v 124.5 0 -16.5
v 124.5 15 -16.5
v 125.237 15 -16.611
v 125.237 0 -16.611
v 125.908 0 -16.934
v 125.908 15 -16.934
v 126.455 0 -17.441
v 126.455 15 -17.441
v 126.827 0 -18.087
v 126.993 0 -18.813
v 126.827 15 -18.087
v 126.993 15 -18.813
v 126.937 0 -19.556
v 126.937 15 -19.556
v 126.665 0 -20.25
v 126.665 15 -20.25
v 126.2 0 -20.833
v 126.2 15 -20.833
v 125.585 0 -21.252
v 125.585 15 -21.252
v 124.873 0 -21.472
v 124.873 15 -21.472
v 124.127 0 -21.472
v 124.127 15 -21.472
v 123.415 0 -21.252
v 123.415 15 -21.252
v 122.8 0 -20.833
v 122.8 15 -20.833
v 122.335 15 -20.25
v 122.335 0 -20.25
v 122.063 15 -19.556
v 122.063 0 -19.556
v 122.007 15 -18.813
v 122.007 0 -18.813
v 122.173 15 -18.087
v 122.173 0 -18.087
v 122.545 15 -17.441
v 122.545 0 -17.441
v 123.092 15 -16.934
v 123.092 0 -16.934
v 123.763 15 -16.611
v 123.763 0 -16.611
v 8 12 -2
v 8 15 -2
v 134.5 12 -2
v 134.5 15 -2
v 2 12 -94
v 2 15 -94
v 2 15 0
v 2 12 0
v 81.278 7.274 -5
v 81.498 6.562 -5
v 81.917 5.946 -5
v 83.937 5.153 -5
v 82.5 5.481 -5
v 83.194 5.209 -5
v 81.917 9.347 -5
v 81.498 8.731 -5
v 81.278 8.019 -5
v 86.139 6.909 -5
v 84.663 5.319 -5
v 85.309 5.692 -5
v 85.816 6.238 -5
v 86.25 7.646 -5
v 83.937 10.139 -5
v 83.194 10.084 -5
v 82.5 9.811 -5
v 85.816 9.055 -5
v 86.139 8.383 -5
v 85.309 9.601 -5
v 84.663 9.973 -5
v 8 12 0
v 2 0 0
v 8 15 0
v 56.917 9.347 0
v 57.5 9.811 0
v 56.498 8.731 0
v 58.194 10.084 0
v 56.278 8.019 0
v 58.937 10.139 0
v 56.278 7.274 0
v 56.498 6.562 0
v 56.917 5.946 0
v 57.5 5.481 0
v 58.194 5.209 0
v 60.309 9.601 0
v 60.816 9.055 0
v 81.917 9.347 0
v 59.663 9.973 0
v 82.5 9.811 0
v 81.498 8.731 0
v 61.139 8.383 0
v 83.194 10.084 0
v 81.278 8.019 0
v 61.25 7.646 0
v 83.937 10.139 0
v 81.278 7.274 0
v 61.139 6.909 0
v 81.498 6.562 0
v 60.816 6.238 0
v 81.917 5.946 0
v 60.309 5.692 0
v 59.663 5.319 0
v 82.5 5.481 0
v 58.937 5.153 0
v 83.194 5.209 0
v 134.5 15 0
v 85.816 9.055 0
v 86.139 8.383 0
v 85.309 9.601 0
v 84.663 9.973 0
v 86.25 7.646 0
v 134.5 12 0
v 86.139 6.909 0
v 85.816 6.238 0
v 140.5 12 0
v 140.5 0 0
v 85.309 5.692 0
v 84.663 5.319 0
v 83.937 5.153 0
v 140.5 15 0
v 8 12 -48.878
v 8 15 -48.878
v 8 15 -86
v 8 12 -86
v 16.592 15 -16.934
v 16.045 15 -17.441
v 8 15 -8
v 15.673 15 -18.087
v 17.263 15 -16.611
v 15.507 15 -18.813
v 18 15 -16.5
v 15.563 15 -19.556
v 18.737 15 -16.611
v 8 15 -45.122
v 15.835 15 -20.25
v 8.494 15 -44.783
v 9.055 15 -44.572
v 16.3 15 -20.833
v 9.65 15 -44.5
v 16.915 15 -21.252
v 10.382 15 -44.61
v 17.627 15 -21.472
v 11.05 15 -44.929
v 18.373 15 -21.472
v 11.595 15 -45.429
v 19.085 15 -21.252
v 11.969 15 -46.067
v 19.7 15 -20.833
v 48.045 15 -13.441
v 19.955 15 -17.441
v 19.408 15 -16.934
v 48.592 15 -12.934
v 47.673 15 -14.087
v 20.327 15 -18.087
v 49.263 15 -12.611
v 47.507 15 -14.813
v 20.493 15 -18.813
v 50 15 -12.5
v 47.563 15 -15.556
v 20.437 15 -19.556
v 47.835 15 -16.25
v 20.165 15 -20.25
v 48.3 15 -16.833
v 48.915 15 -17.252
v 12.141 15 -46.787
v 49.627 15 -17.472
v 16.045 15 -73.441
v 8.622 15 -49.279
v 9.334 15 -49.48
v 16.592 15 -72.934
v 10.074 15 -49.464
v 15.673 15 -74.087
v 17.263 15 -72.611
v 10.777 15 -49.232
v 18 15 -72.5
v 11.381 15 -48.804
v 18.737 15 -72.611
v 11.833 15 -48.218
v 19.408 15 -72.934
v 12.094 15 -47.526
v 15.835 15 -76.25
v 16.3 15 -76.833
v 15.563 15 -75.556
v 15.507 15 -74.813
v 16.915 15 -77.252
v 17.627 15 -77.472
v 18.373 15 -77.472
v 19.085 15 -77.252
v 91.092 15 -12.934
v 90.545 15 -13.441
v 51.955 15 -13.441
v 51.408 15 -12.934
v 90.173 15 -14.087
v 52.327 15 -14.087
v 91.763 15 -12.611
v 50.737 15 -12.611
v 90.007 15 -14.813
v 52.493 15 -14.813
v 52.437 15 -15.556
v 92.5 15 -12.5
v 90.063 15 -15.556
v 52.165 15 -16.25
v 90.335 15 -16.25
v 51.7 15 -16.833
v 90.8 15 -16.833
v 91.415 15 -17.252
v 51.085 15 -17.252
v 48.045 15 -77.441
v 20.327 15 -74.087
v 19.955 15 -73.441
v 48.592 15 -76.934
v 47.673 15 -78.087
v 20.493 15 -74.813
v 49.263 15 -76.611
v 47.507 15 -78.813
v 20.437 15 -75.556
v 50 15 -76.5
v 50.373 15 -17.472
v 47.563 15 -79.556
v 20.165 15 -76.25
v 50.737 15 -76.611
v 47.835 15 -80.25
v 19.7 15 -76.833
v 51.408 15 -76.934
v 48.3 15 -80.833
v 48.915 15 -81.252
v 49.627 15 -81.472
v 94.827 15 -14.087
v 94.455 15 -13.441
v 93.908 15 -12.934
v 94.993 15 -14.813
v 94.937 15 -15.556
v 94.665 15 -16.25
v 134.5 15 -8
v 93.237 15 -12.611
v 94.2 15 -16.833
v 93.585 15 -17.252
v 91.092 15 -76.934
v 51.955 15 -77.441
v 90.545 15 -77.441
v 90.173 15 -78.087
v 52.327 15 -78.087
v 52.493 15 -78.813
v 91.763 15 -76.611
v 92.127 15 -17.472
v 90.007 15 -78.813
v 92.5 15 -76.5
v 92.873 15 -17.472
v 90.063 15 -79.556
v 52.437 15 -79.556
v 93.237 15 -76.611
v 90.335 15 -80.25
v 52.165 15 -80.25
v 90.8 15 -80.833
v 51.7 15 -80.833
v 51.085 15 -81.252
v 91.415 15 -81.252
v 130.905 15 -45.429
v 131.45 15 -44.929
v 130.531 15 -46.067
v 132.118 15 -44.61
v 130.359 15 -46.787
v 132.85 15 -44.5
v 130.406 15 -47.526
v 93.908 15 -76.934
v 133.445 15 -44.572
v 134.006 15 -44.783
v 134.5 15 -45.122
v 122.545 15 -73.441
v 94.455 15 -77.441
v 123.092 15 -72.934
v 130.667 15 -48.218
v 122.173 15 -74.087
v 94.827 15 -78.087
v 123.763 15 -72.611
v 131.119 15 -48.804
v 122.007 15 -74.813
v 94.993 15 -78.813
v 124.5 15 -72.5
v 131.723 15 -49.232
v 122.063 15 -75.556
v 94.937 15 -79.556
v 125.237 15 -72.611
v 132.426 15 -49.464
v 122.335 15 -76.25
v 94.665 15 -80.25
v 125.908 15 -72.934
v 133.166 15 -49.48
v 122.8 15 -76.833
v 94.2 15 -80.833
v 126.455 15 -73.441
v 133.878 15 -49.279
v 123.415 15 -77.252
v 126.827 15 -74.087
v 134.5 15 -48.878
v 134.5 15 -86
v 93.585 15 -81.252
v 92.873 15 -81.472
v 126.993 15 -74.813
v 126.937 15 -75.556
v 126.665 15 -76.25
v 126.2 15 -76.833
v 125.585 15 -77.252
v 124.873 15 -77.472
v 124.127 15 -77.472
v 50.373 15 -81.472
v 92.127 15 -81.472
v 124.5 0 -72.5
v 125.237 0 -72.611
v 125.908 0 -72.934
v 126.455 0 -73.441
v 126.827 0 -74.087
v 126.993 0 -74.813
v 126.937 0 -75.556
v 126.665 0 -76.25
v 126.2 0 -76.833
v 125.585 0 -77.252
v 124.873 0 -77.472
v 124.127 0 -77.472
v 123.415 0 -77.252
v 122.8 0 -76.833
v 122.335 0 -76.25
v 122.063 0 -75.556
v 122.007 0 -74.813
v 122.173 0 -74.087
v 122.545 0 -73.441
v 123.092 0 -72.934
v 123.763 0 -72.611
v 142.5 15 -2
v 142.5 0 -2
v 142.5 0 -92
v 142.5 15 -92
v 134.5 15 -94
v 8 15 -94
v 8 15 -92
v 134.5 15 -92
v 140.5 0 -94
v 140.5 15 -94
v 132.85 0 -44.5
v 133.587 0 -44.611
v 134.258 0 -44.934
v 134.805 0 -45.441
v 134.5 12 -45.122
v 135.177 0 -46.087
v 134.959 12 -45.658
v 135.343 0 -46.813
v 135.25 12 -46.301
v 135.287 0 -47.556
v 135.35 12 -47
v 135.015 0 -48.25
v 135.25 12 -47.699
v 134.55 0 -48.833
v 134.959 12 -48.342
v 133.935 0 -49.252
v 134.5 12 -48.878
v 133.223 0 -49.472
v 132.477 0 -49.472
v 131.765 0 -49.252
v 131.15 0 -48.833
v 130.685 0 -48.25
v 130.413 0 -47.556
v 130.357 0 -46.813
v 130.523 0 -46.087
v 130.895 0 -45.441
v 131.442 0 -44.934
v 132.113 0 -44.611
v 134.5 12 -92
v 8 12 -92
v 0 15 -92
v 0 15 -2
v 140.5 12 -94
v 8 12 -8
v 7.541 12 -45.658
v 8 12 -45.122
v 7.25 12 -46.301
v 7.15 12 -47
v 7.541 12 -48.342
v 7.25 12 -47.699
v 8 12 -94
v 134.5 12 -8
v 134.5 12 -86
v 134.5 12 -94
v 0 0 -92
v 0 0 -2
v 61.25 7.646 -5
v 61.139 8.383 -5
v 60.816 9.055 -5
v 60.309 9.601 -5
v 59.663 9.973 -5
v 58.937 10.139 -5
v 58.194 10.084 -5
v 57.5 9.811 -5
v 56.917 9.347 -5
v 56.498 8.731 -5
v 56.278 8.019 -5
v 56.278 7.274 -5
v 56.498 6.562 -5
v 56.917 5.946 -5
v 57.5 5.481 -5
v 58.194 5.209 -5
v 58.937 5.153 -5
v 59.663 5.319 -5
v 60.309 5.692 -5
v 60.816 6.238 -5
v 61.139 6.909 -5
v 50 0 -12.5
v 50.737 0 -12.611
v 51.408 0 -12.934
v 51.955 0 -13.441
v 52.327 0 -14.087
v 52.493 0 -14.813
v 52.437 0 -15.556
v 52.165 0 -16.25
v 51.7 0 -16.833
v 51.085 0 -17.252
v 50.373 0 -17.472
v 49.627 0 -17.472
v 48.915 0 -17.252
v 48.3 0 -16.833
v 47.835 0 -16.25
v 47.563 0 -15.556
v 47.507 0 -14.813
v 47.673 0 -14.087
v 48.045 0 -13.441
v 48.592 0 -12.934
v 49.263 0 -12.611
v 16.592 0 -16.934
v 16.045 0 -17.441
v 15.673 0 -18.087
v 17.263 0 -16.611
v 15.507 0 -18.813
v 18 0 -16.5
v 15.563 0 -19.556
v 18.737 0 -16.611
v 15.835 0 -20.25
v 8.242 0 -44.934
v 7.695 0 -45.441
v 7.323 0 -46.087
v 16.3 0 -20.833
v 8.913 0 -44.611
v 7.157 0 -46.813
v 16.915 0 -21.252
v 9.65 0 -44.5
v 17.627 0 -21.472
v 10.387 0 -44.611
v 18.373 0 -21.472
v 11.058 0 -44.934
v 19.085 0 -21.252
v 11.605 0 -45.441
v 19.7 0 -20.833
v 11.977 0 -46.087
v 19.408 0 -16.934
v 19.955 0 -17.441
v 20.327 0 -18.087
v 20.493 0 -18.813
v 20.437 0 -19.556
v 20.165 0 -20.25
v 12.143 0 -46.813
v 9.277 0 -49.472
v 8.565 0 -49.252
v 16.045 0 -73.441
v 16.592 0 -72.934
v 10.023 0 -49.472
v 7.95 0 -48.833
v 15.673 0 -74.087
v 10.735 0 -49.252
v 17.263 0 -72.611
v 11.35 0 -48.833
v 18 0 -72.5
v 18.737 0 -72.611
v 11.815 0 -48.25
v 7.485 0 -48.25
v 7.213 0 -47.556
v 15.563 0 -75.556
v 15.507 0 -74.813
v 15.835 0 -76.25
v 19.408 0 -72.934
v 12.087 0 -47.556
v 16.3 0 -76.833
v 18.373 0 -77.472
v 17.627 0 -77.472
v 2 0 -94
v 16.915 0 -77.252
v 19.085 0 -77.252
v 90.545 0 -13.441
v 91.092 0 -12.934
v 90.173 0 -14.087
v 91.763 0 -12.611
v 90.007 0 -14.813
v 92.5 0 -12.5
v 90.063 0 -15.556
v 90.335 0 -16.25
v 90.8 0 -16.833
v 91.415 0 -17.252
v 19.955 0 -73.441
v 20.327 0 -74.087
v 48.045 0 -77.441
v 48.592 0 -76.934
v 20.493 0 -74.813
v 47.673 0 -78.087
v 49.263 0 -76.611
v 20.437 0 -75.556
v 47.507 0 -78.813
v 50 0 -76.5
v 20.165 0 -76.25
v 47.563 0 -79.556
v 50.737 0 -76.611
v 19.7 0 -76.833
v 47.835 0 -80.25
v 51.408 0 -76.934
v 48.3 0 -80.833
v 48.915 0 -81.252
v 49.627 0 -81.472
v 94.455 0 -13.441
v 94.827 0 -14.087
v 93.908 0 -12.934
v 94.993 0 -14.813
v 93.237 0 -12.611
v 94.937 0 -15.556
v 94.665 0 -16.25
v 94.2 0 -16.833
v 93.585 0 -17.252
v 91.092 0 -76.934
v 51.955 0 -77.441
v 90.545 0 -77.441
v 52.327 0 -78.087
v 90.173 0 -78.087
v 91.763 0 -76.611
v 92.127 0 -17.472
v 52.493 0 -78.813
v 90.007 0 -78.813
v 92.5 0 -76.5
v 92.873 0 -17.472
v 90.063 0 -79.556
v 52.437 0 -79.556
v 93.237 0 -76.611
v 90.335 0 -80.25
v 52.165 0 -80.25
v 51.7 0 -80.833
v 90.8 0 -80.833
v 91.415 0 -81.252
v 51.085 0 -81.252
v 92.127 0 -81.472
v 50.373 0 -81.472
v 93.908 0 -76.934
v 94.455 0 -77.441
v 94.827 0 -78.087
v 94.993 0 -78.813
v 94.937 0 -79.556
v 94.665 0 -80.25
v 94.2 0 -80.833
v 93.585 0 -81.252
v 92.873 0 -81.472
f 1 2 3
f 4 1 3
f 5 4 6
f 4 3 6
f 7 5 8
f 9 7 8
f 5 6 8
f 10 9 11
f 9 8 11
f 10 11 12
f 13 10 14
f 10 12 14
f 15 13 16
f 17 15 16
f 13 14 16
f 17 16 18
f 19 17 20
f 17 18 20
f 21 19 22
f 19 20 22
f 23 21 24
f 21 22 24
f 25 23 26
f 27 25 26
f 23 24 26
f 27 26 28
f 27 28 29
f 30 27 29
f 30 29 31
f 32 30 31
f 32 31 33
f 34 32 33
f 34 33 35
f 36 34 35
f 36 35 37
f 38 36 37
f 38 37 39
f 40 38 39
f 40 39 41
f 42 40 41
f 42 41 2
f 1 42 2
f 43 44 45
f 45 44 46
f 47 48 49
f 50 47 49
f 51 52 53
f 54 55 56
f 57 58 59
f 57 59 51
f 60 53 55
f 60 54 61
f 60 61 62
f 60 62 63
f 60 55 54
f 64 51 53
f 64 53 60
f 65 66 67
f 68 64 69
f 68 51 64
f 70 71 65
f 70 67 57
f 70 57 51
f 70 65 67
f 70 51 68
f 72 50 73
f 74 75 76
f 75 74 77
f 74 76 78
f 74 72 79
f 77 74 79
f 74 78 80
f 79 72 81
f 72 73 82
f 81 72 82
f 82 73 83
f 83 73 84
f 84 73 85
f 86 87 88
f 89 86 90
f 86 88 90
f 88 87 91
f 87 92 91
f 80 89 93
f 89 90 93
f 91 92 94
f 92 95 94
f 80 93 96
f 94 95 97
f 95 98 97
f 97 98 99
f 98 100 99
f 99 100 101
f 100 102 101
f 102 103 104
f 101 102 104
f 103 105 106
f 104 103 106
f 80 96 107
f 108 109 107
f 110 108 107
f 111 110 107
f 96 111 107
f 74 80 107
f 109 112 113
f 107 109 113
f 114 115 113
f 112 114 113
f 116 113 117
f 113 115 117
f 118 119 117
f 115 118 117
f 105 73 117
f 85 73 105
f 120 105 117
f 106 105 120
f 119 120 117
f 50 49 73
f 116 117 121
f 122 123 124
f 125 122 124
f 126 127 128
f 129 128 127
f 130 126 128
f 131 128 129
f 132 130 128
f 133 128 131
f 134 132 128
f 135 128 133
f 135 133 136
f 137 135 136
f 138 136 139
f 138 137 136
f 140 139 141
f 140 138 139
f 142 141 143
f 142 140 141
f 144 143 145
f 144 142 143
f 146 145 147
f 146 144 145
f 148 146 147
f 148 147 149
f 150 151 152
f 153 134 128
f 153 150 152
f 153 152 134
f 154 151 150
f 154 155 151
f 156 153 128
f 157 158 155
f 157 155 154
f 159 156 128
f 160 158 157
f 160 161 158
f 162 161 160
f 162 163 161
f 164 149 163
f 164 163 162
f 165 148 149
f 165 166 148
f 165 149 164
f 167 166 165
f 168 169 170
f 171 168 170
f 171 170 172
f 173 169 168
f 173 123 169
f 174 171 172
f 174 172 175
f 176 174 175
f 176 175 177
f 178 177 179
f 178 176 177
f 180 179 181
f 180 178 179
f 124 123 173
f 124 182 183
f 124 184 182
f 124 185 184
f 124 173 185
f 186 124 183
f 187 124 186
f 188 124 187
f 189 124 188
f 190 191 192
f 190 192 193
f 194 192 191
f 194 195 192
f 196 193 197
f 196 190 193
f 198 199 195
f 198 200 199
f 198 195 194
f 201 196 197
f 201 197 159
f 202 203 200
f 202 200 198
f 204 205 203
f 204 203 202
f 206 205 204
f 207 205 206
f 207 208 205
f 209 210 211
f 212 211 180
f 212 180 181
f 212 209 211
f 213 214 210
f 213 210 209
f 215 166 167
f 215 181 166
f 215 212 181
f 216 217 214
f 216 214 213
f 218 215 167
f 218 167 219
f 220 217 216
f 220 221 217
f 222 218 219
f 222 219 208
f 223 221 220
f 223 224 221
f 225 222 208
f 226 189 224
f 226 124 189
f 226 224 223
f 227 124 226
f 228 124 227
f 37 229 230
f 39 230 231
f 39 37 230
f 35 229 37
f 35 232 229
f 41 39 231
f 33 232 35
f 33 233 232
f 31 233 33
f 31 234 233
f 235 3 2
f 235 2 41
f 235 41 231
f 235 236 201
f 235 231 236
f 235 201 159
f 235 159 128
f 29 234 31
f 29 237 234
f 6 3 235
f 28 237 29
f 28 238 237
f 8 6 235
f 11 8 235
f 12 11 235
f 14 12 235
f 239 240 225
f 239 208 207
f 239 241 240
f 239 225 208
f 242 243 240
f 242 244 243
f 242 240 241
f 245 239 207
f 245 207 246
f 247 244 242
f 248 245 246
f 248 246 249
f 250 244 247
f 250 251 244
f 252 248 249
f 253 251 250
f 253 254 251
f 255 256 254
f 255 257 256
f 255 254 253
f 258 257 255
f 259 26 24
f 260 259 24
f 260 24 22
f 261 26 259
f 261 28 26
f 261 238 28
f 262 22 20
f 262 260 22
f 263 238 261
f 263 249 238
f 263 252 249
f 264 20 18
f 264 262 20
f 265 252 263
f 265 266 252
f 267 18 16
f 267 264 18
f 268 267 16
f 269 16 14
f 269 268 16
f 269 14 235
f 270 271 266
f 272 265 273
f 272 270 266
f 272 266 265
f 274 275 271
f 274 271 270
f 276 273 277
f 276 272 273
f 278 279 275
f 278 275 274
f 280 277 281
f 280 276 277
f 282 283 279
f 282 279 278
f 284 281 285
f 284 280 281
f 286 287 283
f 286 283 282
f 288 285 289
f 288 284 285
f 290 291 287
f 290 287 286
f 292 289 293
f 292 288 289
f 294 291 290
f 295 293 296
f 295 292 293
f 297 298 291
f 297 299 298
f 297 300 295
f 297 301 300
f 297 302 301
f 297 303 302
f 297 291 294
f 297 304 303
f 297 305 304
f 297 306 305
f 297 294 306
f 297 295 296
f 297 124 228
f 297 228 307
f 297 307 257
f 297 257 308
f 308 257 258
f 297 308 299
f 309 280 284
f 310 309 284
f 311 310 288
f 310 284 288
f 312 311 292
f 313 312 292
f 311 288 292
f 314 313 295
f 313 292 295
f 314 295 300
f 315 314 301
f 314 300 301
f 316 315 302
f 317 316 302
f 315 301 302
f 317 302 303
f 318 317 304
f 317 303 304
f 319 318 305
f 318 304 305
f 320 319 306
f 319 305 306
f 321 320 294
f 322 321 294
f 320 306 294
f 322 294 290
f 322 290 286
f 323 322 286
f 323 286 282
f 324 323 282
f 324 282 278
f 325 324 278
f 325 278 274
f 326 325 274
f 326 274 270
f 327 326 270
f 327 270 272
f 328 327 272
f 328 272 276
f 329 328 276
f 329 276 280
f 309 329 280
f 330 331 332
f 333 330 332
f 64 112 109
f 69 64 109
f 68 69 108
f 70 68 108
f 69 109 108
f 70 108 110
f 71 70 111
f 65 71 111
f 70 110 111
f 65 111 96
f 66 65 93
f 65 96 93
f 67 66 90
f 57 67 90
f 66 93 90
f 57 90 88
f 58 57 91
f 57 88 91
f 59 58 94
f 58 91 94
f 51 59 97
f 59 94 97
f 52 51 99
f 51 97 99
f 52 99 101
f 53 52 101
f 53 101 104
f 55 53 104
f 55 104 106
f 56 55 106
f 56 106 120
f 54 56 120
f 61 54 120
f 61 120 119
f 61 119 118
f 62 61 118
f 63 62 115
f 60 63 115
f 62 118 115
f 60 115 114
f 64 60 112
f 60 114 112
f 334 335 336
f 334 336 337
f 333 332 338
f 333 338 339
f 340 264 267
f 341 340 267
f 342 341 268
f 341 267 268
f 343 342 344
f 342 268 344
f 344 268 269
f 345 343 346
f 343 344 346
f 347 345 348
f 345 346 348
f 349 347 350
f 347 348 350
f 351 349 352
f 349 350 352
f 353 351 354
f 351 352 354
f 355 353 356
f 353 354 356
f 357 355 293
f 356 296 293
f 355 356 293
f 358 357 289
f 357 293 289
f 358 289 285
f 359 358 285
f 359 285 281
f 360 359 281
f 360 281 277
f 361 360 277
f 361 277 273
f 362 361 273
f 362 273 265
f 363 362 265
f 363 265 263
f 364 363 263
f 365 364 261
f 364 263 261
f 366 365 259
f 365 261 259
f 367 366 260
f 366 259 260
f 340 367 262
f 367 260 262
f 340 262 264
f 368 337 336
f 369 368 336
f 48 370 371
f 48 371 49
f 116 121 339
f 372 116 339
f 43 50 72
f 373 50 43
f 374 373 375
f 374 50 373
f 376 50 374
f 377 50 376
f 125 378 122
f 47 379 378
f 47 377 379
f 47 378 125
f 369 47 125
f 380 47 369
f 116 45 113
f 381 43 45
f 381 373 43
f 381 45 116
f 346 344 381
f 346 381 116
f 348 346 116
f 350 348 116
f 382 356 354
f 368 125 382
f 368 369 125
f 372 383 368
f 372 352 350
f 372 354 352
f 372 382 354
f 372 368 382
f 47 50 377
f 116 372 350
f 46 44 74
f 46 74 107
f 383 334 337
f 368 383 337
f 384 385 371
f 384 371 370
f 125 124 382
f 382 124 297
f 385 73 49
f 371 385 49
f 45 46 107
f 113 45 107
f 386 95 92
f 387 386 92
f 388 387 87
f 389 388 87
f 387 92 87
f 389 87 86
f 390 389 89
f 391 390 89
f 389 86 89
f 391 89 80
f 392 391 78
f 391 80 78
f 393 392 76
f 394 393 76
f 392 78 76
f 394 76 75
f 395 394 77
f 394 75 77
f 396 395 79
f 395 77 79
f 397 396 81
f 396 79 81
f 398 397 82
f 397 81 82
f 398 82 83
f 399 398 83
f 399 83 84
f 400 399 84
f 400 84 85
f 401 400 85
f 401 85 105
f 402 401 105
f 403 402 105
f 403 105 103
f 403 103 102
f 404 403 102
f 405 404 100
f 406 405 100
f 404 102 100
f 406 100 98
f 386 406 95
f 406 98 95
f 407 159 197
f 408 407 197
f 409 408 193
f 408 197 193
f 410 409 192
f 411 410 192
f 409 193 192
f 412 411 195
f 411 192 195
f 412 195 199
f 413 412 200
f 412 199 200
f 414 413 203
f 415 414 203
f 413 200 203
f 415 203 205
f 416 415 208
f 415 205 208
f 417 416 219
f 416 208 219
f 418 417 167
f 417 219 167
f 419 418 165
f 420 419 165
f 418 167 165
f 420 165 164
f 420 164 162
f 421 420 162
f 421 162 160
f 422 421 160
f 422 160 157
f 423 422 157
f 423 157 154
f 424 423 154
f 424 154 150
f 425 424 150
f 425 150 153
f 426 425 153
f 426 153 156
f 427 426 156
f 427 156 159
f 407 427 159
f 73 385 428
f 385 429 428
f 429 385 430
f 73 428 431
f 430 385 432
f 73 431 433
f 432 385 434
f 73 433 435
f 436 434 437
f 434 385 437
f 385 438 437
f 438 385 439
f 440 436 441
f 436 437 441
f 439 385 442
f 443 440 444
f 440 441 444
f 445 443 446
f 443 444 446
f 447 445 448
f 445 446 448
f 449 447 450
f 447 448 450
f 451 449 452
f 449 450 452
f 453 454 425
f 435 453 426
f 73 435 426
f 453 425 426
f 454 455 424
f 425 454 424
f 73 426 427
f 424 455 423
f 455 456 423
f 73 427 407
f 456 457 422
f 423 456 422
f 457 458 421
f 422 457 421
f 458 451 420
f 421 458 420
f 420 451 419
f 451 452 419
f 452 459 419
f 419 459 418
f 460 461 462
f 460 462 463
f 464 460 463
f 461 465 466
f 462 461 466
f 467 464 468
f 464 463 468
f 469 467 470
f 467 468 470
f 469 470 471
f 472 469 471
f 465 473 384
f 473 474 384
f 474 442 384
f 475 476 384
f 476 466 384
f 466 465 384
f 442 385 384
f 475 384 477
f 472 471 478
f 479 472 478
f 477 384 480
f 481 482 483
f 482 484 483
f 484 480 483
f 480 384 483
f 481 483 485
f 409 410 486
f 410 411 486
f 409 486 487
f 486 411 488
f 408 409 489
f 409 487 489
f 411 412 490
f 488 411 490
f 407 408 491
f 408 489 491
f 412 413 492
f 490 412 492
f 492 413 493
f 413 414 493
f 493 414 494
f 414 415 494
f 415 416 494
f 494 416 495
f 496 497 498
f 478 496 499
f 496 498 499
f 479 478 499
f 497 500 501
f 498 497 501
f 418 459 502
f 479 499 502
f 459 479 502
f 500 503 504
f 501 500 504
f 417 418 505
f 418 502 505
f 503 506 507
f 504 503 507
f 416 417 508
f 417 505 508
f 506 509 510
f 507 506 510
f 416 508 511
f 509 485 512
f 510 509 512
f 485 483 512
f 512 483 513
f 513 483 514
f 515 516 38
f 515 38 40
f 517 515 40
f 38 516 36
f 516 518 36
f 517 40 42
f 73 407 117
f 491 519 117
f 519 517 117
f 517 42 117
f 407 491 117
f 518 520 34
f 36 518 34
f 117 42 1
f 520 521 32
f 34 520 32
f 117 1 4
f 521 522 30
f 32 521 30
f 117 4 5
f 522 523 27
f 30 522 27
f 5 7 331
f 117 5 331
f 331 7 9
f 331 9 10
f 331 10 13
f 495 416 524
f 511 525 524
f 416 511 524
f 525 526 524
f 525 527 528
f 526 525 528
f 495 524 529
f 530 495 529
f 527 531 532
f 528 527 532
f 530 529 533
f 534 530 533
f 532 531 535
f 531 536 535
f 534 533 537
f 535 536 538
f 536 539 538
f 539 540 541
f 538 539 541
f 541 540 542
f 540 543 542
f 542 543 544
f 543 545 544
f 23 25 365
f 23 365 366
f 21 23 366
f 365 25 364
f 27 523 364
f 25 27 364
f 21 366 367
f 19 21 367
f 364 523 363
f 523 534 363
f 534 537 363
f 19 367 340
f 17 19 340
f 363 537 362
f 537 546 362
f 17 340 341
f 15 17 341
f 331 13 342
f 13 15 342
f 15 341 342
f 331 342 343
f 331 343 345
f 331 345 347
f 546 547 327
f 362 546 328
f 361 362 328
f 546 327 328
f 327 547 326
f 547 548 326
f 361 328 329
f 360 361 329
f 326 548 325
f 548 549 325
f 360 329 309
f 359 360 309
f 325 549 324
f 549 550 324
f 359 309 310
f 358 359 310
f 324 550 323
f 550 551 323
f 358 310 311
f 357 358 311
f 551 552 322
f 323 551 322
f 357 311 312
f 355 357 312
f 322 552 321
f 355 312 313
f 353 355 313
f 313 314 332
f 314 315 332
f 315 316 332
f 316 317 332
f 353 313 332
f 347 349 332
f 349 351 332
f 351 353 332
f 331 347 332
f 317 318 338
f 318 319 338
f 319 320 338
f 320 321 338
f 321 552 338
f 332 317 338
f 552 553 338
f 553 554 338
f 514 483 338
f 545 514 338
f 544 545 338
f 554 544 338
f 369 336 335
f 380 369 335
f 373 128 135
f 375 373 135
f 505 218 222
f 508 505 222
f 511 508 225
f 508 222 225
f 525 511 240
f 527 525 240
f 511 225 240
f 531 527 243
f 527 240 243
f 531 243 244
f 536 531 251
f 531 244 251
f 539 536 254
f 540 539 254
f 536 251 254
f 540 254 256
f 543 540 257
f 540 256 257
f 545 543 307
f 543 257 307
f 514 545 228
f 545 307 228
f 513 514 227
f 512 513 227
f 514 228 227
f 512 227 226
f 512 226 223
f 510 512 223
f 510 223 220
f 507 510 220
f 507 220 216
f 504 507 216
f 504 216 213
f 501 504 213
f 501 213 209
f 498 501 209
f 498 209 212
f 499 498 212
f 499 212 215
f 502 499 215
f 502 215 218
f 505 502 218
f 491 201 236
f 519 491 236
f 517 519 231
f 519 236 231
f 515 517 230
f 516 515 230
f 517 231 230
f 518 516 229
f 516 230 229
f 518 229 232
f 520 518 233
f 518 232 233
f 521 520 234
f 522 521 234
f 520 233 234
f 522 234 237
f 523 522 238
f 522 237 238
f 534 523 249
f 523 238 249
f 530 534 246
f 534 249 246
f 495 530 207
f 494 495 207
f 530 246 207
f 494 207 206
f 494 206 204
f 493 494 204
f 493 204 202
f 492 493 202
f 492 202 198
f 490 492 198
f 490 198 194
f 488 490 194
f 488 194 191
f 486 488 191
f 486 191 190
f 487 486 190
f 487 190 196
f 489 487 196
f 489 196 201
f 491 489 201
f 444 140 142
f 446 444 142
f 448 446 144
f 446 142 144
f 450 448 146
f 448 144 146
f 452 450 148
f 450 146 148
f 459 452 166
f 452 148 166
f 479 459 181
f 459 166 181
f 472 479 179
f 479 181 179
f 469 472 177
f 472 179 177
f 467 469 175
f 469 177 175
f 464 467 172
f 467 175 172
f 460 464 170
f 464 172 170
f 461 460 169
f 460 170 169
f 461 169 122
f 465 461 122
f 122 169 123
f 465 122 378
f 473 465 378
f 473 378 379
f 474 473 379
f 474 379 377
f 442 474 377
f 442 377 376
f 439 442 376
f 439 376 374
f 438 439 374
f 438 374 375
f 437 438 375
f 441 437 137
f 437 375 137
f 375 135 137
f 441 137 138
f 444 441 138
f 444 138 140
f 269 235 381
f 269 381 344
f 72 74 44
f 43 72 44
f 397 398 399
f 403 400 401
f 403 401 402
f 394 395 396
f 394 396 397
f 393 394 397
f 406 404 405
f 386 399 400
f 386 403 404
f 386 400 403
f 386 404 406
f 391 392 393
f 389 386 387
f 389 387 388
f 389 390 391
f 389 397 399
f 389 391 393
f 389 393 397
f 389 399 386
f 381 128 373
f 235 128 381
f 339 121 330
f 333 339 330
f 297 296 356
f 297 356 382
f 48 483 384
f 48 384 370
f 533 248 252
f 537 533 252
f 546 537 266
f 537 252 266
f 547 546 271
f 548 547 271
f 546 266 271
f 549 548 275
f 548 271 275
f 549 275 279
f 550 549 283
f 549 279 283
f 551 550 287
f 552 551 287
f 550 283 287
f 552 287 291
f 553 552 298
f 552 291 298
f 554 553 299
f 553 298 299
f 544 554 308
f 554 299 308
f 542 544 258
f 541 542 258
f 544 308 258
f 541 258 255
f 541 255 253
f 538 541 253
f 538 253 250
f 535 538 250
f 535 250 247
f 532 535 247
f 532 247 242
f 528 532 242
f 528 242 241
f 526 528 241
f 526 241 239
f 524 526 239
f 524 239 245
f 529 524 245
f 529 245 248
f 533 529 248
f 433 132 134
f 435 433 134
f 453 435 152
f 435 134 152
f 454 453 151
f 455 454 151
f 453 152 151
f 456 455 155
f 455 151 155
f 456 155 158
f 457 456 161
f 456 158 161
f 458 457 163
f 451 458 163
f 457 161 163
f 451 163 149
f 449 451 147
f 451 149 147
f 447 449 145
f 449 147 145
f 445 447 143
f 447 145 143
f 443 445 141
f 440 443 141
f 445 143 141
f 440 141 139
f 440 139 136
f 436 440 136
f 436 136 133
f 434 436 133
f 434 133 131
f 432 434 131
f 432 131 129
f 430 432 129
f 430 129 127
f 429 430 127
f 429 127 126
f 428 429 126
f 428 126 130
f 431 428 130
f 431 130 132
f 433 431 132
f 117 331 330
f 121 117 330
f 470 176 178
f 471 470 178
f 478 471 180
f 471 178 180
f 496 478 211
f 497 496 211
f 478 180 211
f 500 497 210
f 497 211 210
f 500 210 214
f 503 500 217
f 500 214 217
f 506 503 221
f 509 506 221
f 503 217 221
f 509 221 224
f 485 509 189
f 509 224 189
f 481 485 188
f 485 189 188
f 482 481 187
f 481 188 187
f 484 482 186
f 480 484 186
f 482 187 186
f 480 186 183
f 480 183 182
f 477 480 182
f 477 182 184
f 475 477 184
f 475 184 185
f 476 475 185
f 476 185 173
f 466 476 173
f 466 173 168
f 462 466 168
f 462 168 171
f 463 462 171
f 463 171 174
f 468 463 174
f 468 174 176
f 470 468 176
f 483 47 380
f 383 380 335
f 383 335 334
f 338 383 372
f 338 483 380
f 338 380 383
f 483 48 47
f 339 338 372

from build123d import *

# Parameters (mm, degrees)
SKETCH1_W           = 142.5
SKETCH1_H           = 94
BOSS_EXTRUDE1_DEPTH = 15
SKETCH2_W           = 126.5
SKETCH2_H           = 78
CUT_EXTRUDE2_DEPTH  = 3
SKETCH3_R           = 2.5
CUT_EXTRUDE3_DEPTH  = 172.368754445
CHAMFER1_SIZE       = 2
SKETCH4_R           = 2.5
CUT_EXTRUDE6_DEPTH  = 172.368754445
SKETCH6_R           = 2.5
CUT_EXTRUDE7_DEPTH  = 172.368754445
SKETCH7_R           = 2.5
CUT_EXTRUDE8_DEPTH  = 5


with BuildPart() as part:
    # Sketch1 → Boss-Extrude1 (new body)
    with BuildSketch(Plane(origin=(0, 0, 0), x_dir=(1, 0, 0), z_dir=(0, 1, 0))):
        with Locations((71.25, 47)):
            Rectangle(SKETCH1_W, SKETCH1_H)
    extrude(amount=BOSS_EXTRUDE1_DEPTH)

    # Sketch2 → Cut-Extrude2 (cut)
    with BuildSketch(Plane(origin=(0, 15, 0), x_dir=(1, 0, 0), z_dir=(0, 1, 0))):
        Polygon((134.5, 92), (8, 92), (8, 94), (2, 94), (2, 0), (8, 0), (8, 2), (134.5, 2), (134.5, 0), (140.5, 0), (140.5, 94), (134.5, 94), align=None)
        with Locations((71.25, 47)):
            Rectangle(SKETCH2_W, SKETCH2_H, mode=Mode.SUBTRACT)
    extrude(amount=-CUT_EXTRUDE2_DEPTH, mode=Mode.SUBTRACT)

    # Sketch3 → Cut-Extrude3 (cut, through all)
    with BuildSketch(Plane(origin=(0, 15, 0), x_dir=(1, 0, 0), z_dir=(0, 1, 0))):
        with Locations(Location((9.65, 47, 0), (0, 0, 270))):
            Circle(SKETCH3_R)
        with Locations(Location((132.85, 47, 0), (0, 0, 270))):
            Circle(SKETCH3_R)
    extrude(amount=-CUT_EXTRUDE3_DEPTH, mode=Mode.SUBTRACT)

    # Chamfer1
    chamfer1_edges = [part.edges().sort_by_distance(p)[0] for p in [
        (0, 7.5, 0),
        (0, 7.5, -94),
        (142.5, 7.5, -94),
        (142.5, 7.5, 0),
    ]]
    chamfer(chamfer1_edges, length=CHAMFER1_SIZE - 0.0001)  # a hair under: the kernel refuses the full size

    # Sketch4 → Cut-Extrude6 (cut, through all)
    with BuildSketch(Plane(origin=(0, 15, 0), x_dir=(1, 0, 0), z_dir=(0, 1, 0))):
        with Locations(Location((50, 79, 0), (0, 0, 270))):
            Circle(SKETCH4_R)
        with Locations(Location((92.5, 79, 0), (0, 0, 270))):
            Circle(SKETCH4_R)
        with Locations(Location((50, 15, 0), (0, 0, 270))):
            Circle(SKETCH4_R)
        with Locations(Location((92.5, 15, 0), (0, 0, 270))):
            Circle(SKETCH4_R)
    extrude(amount=-CUT_EXTRUDE6_DEPTH, mode=Mode.SUBTRACT)

    # Sketch6 → Cut-Extrude7 (cut, through all)
    with BuildSketch(Plane(origin=(0, 15, 0), x_dir=(1, 0, 0), z_dir=(0, 1, 0))):
        with Locations(Location((124.5, 75, 0), (0, 0, 270))):
            Circle(SKETCH6_R)
        with Locations(Location((18, 75, 0), (0, 0, 270))):
            Circle(SKETCH6_R)
        with Locations(Location((18, 19, 0), (0, 0, 270))):
            Circle(SKETCH6_R)
        with Locations(Location((124.5, 19, 0), (0, 0, 270))):
            Circle(SKETCH6_R)
    extrude(amount=-CUT_EXTRUDE7_DEPTH, mode=Mode.SUBTRACT)

    # Sketch7 → Cut-Extrude8 (cut)
    with BuildSketch(Plane.XY):
        with Locations((58.75, 7.646221832)):
            Circle(SKETCH7_R)
        with Locations((83.75, 7.646221832)):
            Circle(SKETCH7_R)
    extrude(amount=-CUT_EXTRUDE8_DEPTH, mode=Mode.SUBTRACT)


solid = part.part
